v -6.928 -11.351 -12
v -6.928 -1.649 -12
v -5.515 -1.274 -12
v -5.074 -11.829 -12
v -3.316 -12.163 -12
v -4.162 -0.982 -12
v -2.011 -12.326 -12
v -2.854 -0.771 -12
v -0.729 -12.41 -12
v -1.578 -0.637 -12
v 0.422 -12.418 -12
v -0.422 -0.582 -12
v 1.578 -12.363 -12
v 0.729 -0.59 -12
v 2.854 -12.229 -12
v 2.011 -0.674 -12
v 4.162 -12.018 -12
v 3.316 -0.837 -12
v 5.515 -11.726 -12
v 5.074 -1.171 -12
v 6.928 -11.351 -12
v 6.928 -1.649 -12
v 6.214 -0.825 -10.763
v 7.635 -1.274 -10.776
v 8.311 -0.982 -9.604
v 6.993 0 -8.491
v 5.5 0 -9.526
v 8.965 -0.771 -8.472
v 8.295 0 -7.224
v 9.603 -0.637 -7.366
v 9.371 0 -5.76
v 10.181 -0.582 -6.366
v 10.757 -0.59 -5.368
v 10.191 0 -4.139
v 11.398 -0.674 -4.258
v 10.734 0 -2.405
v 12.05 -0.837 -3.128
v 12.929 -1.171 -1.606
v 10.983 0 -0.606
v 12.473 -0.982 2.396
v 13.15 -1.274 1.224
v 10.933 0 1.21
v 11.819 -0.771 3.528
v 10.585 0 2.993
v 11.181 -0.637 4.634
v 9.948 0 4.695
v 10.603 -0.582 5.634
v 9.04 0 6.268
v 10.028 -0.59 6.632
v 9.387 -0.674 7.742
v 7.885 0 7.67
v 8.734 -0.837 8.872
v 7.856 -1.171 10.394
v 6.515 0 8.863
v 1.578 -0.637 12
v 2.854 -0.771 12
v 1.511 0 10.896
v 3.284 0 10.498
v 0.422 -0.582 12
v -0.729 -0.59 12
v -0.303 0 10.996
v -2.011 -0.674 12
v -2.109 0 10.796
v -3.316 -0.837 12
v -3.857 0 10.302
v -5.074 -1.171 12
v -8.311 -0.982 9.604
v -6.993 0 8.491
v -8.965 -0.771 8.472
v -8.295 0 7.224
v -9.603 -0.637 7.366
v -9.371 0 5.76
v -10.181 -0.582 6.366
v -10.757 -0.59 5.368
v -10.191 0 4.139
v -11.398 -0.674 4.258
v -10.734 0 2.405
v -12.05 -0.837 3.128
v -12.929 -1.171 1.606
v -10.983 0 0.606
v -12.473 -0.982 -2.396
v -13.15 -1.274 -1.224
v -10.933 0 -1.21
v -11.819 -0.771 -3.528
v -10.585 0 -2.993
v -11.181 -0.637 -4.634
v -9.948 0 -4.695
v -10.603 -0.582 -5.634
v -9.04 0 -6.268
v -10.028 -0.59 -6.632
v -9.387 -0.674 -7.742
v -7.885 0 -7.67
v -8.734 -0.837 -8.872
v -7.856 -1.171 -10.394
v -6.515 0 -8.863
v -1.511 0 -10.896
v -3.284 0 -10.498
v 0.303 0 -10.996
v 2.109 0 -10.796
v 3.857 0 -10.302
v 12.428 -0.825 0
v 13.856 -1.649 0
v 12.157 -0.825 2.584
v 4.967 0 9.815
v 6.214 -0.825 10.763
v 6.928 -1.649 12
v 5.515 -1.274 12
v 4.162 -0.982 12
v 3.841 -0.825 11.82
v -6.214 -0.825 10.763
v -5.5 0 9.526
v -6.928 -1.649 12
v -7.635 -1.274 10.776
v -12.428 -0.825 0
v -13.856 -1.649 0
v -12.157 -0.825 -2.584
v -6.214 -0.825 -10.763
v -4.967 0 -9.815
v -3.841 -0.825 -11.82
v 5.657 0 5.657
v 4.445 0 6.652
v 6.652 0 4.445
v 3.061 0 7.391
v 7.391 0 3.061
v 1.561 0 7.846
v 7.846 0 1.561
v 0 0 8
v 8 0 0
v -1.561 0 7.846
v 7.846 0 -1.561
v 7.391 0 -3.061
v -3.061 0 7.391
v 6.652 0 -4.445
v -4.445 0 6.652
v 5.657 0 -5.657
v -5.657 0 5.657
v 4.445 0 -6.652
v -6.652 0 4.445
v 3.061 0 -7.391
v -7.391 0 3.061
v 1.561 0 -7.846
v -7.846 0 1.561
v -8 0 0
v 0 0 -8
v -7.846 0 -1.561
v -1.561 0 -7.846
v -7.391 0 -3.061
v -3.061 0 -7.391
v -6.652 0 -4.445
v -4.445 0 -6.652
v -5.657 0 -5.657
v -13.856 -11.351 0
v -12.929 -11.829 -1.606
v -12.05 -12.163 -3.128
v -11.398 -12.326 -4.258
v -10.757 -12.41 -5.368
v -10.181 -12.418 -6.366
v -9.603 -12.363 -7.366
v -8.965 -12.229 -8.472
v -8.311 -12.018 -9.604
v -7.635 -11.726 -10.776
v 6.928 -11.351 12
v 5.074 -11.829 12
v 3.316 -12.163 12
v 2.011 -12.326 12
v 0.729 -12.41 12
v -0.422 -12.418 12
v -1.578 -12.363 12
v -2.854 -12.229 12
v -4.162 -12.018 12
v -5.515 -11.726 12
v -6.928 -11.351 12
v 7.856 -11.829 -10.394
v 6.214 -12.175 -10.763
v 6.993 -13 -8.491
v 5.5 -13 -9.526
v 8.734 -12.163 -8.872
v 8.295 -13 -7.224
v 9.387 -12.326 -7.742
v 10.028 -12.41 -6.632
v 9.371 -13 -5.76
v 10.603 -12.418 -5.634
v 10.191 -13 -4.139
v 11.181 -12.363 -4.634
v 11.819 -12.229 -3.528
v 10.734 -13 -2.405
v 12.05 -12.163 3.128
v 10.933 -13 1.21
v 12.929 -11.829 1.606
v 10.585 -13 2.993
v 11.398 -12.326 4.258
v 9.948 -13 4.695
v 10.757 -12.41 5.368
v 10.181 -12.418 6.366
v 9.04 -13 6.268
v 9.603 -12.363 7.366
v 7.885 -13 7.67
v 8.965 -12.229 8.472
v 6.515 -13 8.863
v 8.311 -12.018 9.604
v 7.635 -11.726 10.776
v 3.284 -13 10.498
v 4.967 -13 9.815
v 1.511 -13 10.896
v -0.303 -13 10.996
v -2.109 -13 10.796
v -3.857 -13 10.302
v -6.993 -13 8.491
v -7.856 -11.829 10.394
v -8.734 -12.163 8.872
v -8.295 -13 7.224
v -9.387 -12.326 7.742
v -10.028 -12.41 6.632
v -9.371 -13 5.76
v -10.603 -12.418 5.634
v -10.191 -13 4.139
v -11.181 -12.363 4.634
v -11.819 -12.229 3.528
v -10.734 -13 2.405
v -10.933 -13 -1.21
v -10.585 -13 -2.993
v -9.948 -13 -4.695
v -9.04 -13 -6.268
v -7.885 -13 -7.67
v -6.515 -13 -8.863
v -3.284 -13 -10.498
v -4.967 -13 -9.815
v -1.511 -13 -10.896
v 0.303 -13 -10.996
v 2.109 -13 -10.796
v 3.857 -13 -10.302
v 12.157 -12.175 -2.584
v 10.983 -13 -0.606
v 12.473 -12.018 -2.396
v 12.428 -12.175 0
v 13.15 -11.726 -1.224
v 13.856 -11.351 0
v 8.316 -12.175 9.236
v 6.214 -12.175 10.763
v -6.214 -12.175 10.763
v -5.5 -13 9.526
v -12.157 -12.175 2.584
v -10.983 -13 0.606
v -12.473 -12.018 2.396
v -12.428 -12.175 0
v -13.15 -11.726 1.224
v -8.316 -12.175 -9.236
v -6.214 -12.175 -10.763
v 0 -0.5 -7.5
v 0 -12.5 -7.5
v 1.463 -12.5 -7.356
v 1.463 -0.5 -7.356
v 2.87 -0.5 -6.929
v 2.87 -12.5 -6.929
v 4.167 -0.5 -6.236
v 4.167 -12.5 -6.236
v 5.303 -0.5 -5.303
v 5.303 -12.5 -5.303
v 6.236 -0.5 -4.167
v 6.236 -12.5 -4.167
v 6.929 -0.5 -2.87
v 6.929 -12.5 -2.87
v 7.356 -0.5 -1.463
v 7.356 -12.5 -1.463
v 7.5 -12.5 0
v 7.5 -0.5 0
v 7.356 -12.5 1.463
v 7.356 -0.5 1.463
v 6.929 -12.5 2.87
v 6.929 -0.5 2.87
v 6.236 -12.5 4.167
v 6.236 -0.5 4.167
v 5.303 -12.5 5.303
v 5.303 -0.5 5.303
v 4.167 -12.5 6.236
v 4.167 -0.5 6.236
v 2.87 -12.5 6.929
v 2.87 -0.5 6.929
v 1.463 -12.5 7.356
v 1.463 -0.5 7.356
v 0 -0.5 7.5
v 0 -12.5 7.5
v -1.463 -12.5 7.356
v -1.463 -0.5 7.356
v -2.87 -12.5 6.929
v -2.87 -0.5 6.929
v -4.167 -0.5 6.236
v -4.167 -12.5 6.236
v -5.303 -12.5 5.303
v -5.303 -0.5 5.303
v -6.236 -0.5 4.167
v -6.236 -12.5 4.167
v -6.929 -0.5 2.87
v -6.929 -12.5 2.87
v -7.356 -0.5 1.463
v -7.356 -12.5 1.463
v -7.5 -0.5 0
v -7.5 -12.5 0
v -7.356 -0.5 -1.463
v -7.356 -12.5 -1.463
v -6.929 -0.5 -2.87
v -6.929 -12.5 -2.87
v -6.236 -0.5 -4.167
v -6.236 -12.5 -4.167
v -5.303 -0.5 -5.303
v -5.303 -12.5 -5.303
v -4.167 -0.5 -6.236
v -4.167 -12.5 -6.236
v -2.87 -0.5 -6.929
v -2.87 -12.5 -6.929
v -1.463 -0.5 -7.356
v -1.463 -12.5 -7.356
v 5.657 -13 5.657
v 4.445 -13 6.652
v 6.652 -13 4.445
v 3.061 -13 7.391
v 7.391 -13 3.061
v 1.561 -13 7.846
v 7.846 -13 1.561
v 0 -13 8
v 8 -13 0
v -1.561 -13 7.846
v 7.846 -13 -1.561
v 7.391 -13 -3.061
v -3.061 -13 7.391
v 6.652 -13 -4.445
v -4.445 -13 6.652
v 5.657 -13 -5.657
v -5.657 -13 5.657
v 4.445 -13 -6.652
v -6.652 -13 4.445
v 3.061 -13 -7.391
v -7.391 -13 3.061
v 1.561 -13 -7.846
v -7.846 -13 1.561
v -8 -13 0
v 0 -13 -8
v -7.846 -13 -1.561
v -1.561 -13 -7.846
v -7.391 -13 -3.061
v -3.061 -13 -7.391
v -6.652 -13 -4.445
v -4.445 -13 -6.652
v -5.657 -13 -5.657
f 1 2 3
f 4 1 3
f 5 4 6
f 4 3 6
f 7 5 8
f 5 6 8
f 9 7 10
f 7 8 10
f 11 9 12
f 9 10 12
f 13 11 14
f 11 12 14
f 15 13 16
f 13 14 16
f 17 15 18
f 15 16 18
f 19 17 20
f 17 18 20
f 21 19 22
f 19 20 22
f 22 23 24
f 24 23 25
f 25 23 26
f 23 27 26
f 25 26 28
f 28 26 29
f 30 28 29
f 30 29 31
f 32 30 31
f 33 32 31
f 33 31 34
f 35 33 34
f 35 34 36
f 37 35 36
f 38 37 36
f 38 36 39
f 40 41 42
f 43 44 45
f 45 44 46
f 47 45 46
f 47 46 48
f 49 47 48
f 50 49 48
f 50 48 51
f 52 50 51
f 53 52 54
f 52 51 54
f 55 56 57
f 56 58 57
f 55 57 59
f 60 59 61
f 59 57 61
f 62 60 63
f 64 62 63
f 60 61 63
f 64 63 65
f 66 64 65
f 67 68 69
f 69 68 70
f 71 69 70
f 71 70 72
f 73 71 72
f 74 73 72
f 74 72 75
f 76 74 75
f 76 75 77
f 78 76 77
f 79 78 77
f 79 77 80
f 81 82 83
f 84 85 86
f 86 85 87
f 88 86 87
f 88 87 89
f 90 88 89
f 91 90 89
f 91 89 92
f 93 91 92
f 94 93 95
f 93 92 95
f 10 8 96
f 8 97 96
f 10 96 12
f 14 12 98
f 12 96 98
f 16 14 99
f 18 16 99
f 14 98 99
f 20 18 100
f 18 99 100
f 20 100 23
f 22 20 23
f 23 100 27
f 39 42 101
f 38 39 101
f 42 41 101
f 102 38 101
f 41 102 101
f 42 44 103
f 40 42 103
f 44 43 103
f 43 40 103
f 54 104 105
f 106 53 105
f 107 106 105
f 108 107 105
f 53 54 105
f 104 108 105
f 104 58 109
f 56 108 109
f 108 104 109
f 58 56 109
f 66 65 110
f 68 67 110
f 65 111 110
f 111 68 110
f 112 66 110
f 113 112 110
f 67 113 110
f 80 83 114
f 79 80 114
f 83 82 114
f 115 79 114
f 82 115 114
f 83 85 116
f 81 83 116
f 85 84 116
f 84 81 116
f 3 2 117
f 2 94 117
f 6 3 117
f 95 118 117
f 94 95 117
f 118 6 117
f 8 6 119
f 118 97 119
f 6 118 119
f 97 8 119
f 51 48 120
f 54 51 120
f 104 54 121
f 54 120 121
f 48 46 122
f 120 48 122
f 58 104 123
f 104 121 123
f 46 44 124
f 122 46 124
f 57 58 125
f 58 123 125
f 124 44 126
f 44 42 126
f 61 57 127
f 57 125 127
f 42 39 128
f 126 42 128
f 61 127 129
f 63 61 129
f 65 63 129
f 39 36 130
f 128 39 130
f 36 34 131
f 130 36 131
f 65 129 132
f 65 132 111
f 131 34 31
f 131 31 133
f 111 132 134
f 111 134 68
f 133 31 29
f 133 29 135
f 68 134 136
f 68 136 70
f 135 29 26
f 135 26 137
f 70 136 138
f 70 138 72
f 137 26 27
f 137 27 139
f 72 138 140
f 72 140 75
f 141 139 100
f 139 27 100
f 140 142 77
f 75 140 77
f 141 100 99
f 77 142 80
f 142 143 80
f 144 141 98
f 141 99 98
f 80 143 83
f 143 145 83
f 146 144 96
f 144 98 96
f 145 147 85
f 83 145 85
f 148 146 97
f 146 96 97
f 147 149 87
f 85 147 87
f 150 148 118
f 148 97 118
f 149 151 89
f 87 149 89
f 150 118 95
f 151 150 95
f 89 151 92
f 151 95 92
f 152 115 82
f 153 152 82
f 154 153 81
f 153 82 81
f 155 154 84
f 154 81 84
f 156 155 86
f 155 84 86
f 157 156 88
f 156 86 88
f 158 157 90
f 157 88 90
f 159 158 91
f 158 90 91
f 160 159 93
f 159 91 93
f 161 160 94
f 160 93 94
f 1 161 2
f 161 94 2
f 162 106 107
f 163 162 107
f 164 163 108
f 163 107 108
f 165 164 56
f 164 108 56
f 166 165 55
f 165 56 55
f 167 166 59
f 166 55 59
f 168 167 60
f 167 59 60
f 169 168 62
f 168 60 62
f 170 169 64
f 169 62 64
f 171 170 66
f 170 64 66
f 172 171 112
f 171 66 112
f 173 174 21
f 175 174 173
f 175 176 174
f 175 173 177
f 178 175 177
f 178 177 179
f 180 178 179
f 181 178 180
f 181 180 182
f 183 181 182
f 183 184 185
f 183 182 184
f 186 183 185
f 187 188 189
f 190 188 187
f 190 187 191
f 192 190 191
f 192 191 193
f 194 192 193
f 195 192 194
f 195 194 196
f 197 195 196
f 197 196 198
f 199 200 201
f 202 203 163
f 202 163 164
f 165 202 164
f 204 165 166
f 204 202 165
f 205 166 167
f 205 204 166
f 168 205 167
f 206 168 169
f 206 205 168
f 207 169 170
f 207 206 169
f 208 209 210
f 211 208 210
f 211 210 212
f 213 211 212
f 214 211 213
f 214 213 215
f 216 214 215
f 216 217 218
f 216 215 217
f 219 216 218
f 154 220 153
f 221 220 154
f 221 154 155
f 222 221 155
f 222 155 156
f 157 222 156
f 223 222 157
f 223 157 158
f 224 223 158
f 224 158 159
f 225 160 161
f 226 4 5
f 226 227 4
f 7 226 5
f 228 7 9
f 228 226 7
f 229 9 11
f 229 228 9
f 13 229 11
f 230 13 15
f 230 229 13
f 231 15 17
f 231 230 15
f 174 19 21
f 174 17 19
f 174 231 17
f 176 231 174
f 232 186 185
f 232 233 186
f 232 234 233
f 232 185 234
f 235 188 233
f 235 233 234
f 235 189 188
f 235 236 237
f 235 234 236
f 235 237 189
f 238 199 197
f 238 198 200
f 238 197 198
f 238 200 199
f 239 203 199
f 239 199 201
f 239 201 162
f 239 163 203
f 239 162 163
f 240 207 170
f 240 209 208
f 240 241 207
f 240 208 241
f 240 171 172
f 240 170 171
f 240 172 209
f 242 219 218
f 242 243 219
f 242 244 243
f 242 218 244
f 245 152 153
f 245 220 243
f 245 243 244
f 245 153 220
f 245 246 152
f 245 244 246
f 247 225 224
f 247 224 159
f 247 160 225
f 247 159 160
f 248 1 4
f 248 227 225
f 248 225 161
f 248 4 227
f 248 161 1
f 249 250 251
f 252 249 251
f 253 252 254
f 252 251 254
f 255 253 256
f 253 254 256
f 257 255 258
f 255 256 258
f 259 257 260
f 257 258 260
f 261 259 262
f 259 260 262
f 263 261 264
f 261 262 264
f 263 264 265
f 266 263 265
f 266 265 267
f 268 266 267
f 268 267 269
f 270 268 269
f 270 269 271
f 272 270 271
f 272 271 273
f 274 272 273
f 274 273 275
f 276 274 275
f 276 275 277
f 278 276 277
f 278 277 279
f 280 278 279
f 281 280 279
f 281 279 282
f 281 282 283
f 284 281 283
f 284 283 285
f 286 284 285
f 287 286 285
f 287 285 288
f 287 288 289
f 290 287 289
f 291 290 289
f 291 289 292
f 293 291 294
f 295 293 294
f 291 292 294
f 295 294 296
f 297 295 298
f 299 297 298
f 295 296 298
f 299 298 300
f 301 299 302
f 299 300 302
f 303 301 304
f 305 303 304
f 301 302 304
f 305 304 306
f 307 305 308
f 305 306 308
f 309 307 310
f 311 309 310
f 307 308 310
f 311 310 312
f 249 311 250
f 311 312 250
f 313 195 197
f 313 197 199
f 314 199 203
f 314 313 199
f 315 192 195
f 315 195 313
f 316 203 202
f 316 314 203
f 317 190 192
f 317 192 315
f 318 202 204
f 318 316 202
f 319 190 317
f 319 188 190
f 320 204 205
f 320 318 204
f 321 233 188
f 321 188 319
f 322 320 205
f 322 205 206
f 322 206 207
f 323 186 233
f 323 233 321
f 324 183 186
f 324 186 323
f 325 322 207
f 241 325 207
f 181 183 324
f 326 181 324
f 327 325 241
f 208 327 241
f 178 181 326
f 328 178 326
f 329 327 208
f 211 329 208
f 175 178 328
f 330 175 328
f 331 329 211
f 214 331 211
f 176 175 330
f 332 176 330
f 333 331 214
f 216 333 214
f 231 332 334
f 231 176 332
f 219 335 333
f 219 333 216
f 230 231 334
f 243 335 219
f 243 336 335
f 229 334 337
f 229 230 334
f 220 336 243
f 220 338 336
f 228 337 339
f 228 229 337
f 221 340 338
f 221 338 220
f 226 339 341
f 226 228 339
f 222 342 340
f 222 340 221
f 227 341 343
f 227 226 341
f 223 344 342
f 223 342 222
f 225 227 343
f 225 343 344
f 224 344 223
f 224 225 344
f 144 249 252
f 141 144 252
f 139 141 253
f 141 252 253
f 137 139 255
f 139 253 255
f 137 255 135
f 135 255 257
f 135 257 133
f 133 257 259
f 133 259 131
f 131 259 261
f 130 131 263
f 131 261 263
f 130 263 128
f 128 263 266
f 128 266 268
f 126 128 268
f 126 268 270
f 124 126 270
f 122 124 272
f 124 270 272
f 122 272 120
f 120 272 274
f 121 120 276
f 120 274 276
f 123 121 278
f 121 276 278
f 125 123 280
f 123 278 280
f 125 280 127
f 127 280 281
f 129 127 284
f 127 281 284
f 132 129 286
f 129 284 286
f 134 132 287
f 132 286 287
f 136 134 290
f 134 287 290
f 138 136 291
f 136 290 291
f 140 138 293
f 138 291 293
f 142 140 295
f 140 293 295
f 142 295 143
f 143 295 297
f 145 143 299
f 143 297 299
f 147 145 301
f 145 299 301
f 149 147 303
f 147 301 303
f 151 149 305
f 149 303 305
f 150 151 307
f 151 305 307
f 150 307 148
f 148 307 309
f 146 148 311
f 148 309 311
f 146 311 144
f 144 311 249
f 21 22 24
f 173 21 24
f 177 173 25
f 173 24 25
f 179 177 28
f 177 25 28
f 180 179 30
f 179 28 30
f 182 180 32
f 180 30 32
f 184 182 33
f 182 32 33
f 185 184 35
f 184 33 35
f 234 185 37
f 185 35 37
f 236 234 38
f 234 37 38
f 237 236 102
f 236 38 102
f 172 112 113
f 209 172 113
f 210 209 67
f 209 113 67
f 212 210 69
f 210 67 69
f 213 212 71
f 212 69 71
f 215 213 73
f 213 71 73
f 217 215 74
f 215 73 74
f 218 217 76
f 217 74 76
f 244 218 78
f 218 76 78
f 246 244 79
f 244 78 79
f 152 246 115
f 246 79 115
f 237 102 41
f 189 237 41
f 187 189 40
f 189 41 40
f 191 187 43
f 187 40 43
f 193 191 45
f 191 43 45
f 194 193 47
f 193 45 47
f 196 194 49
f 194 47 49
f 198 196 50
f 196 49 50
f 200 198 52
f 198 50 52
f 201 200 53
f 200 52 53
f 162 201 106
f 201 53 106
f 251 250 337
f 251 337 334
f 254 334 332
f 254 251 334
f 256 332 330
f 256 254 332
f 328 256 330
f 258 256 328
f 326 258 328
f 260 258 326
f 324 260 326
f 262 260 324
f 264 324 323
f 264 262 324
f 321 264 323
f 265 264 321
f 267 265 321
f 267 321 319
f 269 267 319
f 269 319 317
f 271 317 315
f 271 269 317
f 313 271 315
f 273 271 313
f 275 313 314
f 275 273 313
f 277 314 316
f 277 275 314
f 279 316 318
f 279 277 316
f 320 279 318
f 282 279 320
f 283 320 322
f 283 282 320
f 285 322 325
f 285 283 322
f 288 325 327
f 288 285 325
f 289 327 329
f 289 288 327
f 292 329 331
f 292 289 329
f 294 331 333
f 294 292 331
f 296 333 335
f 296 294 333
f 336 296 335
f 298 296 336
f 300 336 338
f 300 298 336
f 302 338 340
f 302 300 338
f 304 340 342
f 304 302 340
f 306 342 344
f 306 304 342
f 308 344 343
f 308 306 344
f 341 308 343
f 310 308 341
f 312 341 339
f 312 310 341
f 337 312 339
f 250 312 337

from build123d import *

# Parameters (mm, degrees)
EXTRUDE_1_DEPTH     = 13
SKETCH_5_R          = 7.5
CUT_EXTRUDE_1_DEPTH = 23.472205054
CHAMFER_1_SIZE      = 0.5


with BuildPart() as part:
    # Эскиз1 → Вытянуть1 (new body)
    with BuildSketch(Plane(origin=(0, 0, 0), x_dir=(1, 0, 0), z_dir=(0, 1, 0))):
        Polygon((-6.92820323, 12), (6.92820323, 12), (13.856406461, 0), (6.92820323, -12), (-6.92820323, -12), (-13.856406461, 0), align=None)
    extrude(amount=-EXTRUDE_1_DEPTH)

    # Эскиз5 → Вырез-Вытянуть1 (cut, through all)
    with BuildSketch(Plane.XZ.offset(13)):
        with Locations(Location((0, 0, 0), (0, 0, 270))):
            Circle(SKETCH_5_R)
    extrude(amount=-CUT_EXTRUDE_1_DEPTH, mode=Mode.SUBTRACT)

    # Эскиз4 → Вырез-Повернуть1 (revolve, cut)
    with BuildSketch(Plane.XY, mode=Mode.PRIVATE) as cut_revolve_1_sk:
        Polygon((-13.856406461, -1.649147039), (-11, 0), (-13.856406461, 0), align=None)
        Polygon((-13.856406461, -11.350852961), (-11, -13), (-13.856406461, -13), align=None)
    revolve(cut_revolve_1_sk.sketch.rotate(Axis((0, 0, 0), (0, -1, 0)), 119.999999992), axis=Axis((0, 0, 0), (0, -1, 0)), mode=Mode.SUBTRACT)

    # Фаска1
    chamfer_1_edges = [part.edges().sort_by_distance(p)[0] for p in [
        (0, 0, 7.5),
        (0, -13, 7.5),
    ]]
    chamfer(chamfer_1_edges, length=CHAMFER_1_SIZE)


solid = part.part
